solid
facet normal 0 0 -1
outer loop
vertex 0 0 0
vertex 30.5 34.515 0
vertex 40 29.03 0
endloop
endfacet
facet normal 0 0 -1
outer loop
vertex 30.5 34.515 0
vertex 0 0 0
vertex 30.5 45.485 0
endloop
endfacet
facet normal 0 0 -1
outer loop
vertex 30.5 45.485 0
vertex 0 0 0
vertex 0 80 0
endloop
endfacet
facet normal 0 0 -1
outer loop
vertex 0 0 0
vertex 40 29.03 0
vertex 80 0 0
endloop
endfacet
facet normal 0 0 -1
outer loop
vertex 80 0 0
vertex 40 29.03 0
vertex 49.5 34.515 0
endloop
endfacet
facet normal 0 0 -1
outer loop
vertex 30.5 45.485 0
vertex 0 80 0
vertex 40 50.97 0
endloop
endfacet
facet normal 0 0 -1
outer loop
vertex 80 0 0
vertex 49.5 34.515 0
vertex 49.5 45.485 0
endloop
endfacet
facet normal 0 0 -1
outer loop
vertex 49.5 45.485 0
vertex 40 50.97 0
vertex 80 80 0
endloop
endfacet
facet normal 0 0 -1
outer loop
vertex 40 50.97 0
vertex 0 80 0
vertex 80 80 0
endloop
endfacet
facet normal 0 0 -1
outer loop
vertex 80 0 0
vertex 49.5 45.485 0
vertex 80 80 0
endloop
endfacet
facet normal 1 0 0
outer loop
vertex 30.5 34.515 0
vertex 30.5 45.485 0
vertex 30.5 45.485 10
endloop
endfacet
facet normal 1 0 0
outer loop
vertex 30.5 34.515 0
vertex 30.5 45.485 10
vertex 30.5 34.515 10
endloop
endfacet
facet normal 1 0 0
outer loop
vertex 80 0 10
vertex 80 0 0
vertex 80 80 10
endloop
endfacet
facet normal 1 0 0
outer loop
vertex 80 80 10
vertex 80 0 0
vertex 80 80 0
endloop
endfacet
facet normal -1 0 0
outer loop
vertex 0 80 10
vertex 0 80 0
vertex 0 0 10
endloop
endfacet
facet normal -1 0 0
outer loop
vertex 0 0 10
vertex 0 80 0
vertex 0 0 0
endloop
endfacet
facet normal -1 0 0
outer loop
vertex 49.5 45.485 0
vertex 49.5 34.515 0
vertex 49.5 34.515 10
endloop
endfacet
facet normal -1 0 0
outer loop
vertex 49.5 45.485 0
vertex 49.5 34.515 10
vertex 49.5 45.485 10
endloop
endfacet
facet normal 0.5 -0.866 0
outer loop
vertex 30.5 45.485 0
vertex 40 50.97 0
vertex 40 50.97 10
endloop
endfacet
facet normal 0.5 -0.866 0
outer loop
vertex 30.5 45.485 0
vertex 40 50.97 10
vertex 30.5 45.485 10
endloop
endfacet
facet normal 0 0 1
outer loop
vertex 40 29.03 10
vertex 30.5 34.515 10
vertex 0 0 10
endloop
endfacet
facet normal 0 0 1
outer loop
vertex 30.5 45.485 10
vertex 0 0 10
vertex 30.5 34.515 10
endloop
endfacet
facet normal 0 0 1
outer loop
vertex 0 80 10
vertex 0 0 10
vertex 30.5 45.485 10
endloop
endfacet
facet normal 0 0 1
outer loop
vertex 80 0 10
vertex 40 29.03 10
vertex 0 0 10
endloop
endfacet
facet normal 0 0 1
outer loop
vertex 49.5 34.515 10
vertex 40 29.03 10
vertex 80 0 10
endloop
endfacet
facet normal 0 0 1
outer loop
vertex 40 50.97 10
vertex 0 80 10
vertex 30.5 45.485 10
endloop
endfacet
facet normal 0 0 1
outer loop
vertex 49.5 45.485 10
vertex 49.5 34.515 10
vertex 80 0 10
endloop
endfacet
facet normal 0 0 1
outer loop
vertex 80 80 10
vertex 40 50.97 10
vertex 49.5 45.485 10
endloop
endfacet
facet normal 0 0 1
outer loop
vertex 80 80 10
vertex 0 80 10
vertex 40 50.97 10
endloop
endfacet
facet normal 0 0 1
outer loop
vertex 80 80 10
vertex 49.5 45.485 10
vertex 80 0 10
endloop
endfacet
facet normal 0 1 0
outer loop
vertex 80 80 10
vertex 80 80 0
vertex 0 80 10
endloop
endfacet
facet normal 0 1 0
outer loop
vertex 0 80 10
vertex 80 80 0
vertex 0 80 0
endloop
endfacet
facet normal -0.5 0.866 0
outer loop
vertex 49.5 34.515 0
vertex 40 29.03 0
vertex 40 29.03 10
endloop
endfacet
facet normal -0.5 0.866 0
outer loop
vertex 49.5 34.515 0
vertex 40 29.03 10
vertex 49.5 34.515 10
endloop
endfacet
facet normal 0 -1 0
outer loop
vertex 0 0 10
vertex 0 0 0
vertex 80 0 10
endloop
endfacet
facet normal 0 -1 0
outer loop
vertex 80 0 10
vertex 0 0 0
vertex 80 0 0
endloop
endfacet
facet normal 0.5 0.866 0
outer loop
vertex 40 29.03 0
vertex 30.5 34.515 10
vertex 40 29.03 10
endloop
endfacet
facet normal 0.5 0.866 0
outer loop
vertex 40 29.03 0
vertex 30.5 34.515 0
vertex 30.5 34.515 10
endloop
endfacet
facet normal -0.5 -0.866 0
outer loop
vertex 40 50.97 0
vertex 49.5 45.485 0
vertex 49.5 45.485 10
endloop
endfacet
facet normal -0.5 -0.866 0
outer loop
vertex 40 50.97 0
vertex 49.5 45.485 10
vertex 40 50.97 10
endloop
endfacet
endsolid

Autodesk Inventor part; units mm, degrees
ref_plane "YZ Plane" through (0, 0, 0) normal (1, 0, 0) x (0, 1, 0)
ref_plane "XZ Plane" through (0, 0, 0) normal (0, 1, 0) x (-1, 0, 0)
ref_plane "XY Plane" through (0, 0, 0) normal (0, 0, 1) x (1, 0, 0)
sketch "Sketch1" plane through (0, 0, 0) normal (0, 0, 1) x (1, 0, 0)
  line L0 (0, 0) -> (80, 0)
  line L1 (80, 0) -> (80, 80)
  line L2 (80, 80) -> (0, 80)
  line L3 (0, 80) -> (0, 0)
  dimension "d4" = 80
  dimension "d5" = 80
extrude "Extrusion1" add sketch "Sketch1" along normal blind 10
sketch "Sketch2" plane through (0, 0, 0) normal (0, 0, -1) x (-1, 0, 0)
  line L0 (-49.5, 34.5152) -> (-49.5, 45.4848) projected
  line L1 (-49.5, 45.4848) -> (-40, 50.9697) projected
  line L2 (-40, 50.9697) -> (-30.5, 45.4848) projected
  line L3 (-30.5, 45.4848) -> (-30.5, 34.5152) projected
  line L4 (-30.5, 34.5152) -> (-40, 29.0303) projected
  line L5 (-40, 29.0303) -> (-49.5, 34.5152) projected
  point P0 (0, 0)
extrude "Extrusion2" cut sketch "Sketch2" against normal blind 20
equation "\"d4\" = 2 * nutdist"
equation "\"d5\" = 2 * nutdist"
equation "\"d0\" = nutholdert"
equation "\"d2\" = platft"
equation "\"lcsd\" = 19.05"
equation "\"lcwd1\" = 25"
equation "\"lcwd2\" = 34"
equation "\"lch1\" = 39"
equation "\"lcwd3\" = 43"
equation "\"dia1\" = 6"
equation "\"td\" = 18"
equation "\"bhh\" = 6"
equation "\"sw\" = 25"
equation "\"sh\" = 31"
equation "\"spacert\" = 2"
equation "\"platft\" = 20"
equation "\"pvct\" = 5"
equation "\"dia3\" = 8"
equation "\"dia4\" = 11"
equation "\"tankl\" = 379"
equation "\"play\" = 9"
equation "\"holeh\" = 26"
equation "\"surroundt\" = 5"
equation "\"slack\" = 0.5"
equation "\"play2\" = 3"
equation "\"diawater\" = 25"
equation "\"diaoverflow\" = 25"
equation "\"diaph\" = 32"
equation "\"diacucl\" = 32"
equation "\"diaair\" = 32"
equation "\"diasurroundhole\" = 42"
equation "\"diagrate\" = 12"
equation "\"gratespacing\" = 12.02082"
equation "\"sidedist\" = 13.9375"
equation "\"bottomdist\" = 9.6355"
equation "\"diahcl\" = 32"
equation "\"bracketwtop\" = 6"
equation "\"bracketwbottom\" = 6"
equation "\"nett\" = 1"
equation "\"nethole\" = 16"
equation "\"netside\" = 3.5"
equation "\"nettop\" = 7"
equation "\"netholespacing\" = 2"
equation "\"nutholdert\" = 10"
equation "\"diaetape\" = 32"
equation "\"nutdist\" = 40"
properties part number "platform nut holder" material "PVC-Piping"
